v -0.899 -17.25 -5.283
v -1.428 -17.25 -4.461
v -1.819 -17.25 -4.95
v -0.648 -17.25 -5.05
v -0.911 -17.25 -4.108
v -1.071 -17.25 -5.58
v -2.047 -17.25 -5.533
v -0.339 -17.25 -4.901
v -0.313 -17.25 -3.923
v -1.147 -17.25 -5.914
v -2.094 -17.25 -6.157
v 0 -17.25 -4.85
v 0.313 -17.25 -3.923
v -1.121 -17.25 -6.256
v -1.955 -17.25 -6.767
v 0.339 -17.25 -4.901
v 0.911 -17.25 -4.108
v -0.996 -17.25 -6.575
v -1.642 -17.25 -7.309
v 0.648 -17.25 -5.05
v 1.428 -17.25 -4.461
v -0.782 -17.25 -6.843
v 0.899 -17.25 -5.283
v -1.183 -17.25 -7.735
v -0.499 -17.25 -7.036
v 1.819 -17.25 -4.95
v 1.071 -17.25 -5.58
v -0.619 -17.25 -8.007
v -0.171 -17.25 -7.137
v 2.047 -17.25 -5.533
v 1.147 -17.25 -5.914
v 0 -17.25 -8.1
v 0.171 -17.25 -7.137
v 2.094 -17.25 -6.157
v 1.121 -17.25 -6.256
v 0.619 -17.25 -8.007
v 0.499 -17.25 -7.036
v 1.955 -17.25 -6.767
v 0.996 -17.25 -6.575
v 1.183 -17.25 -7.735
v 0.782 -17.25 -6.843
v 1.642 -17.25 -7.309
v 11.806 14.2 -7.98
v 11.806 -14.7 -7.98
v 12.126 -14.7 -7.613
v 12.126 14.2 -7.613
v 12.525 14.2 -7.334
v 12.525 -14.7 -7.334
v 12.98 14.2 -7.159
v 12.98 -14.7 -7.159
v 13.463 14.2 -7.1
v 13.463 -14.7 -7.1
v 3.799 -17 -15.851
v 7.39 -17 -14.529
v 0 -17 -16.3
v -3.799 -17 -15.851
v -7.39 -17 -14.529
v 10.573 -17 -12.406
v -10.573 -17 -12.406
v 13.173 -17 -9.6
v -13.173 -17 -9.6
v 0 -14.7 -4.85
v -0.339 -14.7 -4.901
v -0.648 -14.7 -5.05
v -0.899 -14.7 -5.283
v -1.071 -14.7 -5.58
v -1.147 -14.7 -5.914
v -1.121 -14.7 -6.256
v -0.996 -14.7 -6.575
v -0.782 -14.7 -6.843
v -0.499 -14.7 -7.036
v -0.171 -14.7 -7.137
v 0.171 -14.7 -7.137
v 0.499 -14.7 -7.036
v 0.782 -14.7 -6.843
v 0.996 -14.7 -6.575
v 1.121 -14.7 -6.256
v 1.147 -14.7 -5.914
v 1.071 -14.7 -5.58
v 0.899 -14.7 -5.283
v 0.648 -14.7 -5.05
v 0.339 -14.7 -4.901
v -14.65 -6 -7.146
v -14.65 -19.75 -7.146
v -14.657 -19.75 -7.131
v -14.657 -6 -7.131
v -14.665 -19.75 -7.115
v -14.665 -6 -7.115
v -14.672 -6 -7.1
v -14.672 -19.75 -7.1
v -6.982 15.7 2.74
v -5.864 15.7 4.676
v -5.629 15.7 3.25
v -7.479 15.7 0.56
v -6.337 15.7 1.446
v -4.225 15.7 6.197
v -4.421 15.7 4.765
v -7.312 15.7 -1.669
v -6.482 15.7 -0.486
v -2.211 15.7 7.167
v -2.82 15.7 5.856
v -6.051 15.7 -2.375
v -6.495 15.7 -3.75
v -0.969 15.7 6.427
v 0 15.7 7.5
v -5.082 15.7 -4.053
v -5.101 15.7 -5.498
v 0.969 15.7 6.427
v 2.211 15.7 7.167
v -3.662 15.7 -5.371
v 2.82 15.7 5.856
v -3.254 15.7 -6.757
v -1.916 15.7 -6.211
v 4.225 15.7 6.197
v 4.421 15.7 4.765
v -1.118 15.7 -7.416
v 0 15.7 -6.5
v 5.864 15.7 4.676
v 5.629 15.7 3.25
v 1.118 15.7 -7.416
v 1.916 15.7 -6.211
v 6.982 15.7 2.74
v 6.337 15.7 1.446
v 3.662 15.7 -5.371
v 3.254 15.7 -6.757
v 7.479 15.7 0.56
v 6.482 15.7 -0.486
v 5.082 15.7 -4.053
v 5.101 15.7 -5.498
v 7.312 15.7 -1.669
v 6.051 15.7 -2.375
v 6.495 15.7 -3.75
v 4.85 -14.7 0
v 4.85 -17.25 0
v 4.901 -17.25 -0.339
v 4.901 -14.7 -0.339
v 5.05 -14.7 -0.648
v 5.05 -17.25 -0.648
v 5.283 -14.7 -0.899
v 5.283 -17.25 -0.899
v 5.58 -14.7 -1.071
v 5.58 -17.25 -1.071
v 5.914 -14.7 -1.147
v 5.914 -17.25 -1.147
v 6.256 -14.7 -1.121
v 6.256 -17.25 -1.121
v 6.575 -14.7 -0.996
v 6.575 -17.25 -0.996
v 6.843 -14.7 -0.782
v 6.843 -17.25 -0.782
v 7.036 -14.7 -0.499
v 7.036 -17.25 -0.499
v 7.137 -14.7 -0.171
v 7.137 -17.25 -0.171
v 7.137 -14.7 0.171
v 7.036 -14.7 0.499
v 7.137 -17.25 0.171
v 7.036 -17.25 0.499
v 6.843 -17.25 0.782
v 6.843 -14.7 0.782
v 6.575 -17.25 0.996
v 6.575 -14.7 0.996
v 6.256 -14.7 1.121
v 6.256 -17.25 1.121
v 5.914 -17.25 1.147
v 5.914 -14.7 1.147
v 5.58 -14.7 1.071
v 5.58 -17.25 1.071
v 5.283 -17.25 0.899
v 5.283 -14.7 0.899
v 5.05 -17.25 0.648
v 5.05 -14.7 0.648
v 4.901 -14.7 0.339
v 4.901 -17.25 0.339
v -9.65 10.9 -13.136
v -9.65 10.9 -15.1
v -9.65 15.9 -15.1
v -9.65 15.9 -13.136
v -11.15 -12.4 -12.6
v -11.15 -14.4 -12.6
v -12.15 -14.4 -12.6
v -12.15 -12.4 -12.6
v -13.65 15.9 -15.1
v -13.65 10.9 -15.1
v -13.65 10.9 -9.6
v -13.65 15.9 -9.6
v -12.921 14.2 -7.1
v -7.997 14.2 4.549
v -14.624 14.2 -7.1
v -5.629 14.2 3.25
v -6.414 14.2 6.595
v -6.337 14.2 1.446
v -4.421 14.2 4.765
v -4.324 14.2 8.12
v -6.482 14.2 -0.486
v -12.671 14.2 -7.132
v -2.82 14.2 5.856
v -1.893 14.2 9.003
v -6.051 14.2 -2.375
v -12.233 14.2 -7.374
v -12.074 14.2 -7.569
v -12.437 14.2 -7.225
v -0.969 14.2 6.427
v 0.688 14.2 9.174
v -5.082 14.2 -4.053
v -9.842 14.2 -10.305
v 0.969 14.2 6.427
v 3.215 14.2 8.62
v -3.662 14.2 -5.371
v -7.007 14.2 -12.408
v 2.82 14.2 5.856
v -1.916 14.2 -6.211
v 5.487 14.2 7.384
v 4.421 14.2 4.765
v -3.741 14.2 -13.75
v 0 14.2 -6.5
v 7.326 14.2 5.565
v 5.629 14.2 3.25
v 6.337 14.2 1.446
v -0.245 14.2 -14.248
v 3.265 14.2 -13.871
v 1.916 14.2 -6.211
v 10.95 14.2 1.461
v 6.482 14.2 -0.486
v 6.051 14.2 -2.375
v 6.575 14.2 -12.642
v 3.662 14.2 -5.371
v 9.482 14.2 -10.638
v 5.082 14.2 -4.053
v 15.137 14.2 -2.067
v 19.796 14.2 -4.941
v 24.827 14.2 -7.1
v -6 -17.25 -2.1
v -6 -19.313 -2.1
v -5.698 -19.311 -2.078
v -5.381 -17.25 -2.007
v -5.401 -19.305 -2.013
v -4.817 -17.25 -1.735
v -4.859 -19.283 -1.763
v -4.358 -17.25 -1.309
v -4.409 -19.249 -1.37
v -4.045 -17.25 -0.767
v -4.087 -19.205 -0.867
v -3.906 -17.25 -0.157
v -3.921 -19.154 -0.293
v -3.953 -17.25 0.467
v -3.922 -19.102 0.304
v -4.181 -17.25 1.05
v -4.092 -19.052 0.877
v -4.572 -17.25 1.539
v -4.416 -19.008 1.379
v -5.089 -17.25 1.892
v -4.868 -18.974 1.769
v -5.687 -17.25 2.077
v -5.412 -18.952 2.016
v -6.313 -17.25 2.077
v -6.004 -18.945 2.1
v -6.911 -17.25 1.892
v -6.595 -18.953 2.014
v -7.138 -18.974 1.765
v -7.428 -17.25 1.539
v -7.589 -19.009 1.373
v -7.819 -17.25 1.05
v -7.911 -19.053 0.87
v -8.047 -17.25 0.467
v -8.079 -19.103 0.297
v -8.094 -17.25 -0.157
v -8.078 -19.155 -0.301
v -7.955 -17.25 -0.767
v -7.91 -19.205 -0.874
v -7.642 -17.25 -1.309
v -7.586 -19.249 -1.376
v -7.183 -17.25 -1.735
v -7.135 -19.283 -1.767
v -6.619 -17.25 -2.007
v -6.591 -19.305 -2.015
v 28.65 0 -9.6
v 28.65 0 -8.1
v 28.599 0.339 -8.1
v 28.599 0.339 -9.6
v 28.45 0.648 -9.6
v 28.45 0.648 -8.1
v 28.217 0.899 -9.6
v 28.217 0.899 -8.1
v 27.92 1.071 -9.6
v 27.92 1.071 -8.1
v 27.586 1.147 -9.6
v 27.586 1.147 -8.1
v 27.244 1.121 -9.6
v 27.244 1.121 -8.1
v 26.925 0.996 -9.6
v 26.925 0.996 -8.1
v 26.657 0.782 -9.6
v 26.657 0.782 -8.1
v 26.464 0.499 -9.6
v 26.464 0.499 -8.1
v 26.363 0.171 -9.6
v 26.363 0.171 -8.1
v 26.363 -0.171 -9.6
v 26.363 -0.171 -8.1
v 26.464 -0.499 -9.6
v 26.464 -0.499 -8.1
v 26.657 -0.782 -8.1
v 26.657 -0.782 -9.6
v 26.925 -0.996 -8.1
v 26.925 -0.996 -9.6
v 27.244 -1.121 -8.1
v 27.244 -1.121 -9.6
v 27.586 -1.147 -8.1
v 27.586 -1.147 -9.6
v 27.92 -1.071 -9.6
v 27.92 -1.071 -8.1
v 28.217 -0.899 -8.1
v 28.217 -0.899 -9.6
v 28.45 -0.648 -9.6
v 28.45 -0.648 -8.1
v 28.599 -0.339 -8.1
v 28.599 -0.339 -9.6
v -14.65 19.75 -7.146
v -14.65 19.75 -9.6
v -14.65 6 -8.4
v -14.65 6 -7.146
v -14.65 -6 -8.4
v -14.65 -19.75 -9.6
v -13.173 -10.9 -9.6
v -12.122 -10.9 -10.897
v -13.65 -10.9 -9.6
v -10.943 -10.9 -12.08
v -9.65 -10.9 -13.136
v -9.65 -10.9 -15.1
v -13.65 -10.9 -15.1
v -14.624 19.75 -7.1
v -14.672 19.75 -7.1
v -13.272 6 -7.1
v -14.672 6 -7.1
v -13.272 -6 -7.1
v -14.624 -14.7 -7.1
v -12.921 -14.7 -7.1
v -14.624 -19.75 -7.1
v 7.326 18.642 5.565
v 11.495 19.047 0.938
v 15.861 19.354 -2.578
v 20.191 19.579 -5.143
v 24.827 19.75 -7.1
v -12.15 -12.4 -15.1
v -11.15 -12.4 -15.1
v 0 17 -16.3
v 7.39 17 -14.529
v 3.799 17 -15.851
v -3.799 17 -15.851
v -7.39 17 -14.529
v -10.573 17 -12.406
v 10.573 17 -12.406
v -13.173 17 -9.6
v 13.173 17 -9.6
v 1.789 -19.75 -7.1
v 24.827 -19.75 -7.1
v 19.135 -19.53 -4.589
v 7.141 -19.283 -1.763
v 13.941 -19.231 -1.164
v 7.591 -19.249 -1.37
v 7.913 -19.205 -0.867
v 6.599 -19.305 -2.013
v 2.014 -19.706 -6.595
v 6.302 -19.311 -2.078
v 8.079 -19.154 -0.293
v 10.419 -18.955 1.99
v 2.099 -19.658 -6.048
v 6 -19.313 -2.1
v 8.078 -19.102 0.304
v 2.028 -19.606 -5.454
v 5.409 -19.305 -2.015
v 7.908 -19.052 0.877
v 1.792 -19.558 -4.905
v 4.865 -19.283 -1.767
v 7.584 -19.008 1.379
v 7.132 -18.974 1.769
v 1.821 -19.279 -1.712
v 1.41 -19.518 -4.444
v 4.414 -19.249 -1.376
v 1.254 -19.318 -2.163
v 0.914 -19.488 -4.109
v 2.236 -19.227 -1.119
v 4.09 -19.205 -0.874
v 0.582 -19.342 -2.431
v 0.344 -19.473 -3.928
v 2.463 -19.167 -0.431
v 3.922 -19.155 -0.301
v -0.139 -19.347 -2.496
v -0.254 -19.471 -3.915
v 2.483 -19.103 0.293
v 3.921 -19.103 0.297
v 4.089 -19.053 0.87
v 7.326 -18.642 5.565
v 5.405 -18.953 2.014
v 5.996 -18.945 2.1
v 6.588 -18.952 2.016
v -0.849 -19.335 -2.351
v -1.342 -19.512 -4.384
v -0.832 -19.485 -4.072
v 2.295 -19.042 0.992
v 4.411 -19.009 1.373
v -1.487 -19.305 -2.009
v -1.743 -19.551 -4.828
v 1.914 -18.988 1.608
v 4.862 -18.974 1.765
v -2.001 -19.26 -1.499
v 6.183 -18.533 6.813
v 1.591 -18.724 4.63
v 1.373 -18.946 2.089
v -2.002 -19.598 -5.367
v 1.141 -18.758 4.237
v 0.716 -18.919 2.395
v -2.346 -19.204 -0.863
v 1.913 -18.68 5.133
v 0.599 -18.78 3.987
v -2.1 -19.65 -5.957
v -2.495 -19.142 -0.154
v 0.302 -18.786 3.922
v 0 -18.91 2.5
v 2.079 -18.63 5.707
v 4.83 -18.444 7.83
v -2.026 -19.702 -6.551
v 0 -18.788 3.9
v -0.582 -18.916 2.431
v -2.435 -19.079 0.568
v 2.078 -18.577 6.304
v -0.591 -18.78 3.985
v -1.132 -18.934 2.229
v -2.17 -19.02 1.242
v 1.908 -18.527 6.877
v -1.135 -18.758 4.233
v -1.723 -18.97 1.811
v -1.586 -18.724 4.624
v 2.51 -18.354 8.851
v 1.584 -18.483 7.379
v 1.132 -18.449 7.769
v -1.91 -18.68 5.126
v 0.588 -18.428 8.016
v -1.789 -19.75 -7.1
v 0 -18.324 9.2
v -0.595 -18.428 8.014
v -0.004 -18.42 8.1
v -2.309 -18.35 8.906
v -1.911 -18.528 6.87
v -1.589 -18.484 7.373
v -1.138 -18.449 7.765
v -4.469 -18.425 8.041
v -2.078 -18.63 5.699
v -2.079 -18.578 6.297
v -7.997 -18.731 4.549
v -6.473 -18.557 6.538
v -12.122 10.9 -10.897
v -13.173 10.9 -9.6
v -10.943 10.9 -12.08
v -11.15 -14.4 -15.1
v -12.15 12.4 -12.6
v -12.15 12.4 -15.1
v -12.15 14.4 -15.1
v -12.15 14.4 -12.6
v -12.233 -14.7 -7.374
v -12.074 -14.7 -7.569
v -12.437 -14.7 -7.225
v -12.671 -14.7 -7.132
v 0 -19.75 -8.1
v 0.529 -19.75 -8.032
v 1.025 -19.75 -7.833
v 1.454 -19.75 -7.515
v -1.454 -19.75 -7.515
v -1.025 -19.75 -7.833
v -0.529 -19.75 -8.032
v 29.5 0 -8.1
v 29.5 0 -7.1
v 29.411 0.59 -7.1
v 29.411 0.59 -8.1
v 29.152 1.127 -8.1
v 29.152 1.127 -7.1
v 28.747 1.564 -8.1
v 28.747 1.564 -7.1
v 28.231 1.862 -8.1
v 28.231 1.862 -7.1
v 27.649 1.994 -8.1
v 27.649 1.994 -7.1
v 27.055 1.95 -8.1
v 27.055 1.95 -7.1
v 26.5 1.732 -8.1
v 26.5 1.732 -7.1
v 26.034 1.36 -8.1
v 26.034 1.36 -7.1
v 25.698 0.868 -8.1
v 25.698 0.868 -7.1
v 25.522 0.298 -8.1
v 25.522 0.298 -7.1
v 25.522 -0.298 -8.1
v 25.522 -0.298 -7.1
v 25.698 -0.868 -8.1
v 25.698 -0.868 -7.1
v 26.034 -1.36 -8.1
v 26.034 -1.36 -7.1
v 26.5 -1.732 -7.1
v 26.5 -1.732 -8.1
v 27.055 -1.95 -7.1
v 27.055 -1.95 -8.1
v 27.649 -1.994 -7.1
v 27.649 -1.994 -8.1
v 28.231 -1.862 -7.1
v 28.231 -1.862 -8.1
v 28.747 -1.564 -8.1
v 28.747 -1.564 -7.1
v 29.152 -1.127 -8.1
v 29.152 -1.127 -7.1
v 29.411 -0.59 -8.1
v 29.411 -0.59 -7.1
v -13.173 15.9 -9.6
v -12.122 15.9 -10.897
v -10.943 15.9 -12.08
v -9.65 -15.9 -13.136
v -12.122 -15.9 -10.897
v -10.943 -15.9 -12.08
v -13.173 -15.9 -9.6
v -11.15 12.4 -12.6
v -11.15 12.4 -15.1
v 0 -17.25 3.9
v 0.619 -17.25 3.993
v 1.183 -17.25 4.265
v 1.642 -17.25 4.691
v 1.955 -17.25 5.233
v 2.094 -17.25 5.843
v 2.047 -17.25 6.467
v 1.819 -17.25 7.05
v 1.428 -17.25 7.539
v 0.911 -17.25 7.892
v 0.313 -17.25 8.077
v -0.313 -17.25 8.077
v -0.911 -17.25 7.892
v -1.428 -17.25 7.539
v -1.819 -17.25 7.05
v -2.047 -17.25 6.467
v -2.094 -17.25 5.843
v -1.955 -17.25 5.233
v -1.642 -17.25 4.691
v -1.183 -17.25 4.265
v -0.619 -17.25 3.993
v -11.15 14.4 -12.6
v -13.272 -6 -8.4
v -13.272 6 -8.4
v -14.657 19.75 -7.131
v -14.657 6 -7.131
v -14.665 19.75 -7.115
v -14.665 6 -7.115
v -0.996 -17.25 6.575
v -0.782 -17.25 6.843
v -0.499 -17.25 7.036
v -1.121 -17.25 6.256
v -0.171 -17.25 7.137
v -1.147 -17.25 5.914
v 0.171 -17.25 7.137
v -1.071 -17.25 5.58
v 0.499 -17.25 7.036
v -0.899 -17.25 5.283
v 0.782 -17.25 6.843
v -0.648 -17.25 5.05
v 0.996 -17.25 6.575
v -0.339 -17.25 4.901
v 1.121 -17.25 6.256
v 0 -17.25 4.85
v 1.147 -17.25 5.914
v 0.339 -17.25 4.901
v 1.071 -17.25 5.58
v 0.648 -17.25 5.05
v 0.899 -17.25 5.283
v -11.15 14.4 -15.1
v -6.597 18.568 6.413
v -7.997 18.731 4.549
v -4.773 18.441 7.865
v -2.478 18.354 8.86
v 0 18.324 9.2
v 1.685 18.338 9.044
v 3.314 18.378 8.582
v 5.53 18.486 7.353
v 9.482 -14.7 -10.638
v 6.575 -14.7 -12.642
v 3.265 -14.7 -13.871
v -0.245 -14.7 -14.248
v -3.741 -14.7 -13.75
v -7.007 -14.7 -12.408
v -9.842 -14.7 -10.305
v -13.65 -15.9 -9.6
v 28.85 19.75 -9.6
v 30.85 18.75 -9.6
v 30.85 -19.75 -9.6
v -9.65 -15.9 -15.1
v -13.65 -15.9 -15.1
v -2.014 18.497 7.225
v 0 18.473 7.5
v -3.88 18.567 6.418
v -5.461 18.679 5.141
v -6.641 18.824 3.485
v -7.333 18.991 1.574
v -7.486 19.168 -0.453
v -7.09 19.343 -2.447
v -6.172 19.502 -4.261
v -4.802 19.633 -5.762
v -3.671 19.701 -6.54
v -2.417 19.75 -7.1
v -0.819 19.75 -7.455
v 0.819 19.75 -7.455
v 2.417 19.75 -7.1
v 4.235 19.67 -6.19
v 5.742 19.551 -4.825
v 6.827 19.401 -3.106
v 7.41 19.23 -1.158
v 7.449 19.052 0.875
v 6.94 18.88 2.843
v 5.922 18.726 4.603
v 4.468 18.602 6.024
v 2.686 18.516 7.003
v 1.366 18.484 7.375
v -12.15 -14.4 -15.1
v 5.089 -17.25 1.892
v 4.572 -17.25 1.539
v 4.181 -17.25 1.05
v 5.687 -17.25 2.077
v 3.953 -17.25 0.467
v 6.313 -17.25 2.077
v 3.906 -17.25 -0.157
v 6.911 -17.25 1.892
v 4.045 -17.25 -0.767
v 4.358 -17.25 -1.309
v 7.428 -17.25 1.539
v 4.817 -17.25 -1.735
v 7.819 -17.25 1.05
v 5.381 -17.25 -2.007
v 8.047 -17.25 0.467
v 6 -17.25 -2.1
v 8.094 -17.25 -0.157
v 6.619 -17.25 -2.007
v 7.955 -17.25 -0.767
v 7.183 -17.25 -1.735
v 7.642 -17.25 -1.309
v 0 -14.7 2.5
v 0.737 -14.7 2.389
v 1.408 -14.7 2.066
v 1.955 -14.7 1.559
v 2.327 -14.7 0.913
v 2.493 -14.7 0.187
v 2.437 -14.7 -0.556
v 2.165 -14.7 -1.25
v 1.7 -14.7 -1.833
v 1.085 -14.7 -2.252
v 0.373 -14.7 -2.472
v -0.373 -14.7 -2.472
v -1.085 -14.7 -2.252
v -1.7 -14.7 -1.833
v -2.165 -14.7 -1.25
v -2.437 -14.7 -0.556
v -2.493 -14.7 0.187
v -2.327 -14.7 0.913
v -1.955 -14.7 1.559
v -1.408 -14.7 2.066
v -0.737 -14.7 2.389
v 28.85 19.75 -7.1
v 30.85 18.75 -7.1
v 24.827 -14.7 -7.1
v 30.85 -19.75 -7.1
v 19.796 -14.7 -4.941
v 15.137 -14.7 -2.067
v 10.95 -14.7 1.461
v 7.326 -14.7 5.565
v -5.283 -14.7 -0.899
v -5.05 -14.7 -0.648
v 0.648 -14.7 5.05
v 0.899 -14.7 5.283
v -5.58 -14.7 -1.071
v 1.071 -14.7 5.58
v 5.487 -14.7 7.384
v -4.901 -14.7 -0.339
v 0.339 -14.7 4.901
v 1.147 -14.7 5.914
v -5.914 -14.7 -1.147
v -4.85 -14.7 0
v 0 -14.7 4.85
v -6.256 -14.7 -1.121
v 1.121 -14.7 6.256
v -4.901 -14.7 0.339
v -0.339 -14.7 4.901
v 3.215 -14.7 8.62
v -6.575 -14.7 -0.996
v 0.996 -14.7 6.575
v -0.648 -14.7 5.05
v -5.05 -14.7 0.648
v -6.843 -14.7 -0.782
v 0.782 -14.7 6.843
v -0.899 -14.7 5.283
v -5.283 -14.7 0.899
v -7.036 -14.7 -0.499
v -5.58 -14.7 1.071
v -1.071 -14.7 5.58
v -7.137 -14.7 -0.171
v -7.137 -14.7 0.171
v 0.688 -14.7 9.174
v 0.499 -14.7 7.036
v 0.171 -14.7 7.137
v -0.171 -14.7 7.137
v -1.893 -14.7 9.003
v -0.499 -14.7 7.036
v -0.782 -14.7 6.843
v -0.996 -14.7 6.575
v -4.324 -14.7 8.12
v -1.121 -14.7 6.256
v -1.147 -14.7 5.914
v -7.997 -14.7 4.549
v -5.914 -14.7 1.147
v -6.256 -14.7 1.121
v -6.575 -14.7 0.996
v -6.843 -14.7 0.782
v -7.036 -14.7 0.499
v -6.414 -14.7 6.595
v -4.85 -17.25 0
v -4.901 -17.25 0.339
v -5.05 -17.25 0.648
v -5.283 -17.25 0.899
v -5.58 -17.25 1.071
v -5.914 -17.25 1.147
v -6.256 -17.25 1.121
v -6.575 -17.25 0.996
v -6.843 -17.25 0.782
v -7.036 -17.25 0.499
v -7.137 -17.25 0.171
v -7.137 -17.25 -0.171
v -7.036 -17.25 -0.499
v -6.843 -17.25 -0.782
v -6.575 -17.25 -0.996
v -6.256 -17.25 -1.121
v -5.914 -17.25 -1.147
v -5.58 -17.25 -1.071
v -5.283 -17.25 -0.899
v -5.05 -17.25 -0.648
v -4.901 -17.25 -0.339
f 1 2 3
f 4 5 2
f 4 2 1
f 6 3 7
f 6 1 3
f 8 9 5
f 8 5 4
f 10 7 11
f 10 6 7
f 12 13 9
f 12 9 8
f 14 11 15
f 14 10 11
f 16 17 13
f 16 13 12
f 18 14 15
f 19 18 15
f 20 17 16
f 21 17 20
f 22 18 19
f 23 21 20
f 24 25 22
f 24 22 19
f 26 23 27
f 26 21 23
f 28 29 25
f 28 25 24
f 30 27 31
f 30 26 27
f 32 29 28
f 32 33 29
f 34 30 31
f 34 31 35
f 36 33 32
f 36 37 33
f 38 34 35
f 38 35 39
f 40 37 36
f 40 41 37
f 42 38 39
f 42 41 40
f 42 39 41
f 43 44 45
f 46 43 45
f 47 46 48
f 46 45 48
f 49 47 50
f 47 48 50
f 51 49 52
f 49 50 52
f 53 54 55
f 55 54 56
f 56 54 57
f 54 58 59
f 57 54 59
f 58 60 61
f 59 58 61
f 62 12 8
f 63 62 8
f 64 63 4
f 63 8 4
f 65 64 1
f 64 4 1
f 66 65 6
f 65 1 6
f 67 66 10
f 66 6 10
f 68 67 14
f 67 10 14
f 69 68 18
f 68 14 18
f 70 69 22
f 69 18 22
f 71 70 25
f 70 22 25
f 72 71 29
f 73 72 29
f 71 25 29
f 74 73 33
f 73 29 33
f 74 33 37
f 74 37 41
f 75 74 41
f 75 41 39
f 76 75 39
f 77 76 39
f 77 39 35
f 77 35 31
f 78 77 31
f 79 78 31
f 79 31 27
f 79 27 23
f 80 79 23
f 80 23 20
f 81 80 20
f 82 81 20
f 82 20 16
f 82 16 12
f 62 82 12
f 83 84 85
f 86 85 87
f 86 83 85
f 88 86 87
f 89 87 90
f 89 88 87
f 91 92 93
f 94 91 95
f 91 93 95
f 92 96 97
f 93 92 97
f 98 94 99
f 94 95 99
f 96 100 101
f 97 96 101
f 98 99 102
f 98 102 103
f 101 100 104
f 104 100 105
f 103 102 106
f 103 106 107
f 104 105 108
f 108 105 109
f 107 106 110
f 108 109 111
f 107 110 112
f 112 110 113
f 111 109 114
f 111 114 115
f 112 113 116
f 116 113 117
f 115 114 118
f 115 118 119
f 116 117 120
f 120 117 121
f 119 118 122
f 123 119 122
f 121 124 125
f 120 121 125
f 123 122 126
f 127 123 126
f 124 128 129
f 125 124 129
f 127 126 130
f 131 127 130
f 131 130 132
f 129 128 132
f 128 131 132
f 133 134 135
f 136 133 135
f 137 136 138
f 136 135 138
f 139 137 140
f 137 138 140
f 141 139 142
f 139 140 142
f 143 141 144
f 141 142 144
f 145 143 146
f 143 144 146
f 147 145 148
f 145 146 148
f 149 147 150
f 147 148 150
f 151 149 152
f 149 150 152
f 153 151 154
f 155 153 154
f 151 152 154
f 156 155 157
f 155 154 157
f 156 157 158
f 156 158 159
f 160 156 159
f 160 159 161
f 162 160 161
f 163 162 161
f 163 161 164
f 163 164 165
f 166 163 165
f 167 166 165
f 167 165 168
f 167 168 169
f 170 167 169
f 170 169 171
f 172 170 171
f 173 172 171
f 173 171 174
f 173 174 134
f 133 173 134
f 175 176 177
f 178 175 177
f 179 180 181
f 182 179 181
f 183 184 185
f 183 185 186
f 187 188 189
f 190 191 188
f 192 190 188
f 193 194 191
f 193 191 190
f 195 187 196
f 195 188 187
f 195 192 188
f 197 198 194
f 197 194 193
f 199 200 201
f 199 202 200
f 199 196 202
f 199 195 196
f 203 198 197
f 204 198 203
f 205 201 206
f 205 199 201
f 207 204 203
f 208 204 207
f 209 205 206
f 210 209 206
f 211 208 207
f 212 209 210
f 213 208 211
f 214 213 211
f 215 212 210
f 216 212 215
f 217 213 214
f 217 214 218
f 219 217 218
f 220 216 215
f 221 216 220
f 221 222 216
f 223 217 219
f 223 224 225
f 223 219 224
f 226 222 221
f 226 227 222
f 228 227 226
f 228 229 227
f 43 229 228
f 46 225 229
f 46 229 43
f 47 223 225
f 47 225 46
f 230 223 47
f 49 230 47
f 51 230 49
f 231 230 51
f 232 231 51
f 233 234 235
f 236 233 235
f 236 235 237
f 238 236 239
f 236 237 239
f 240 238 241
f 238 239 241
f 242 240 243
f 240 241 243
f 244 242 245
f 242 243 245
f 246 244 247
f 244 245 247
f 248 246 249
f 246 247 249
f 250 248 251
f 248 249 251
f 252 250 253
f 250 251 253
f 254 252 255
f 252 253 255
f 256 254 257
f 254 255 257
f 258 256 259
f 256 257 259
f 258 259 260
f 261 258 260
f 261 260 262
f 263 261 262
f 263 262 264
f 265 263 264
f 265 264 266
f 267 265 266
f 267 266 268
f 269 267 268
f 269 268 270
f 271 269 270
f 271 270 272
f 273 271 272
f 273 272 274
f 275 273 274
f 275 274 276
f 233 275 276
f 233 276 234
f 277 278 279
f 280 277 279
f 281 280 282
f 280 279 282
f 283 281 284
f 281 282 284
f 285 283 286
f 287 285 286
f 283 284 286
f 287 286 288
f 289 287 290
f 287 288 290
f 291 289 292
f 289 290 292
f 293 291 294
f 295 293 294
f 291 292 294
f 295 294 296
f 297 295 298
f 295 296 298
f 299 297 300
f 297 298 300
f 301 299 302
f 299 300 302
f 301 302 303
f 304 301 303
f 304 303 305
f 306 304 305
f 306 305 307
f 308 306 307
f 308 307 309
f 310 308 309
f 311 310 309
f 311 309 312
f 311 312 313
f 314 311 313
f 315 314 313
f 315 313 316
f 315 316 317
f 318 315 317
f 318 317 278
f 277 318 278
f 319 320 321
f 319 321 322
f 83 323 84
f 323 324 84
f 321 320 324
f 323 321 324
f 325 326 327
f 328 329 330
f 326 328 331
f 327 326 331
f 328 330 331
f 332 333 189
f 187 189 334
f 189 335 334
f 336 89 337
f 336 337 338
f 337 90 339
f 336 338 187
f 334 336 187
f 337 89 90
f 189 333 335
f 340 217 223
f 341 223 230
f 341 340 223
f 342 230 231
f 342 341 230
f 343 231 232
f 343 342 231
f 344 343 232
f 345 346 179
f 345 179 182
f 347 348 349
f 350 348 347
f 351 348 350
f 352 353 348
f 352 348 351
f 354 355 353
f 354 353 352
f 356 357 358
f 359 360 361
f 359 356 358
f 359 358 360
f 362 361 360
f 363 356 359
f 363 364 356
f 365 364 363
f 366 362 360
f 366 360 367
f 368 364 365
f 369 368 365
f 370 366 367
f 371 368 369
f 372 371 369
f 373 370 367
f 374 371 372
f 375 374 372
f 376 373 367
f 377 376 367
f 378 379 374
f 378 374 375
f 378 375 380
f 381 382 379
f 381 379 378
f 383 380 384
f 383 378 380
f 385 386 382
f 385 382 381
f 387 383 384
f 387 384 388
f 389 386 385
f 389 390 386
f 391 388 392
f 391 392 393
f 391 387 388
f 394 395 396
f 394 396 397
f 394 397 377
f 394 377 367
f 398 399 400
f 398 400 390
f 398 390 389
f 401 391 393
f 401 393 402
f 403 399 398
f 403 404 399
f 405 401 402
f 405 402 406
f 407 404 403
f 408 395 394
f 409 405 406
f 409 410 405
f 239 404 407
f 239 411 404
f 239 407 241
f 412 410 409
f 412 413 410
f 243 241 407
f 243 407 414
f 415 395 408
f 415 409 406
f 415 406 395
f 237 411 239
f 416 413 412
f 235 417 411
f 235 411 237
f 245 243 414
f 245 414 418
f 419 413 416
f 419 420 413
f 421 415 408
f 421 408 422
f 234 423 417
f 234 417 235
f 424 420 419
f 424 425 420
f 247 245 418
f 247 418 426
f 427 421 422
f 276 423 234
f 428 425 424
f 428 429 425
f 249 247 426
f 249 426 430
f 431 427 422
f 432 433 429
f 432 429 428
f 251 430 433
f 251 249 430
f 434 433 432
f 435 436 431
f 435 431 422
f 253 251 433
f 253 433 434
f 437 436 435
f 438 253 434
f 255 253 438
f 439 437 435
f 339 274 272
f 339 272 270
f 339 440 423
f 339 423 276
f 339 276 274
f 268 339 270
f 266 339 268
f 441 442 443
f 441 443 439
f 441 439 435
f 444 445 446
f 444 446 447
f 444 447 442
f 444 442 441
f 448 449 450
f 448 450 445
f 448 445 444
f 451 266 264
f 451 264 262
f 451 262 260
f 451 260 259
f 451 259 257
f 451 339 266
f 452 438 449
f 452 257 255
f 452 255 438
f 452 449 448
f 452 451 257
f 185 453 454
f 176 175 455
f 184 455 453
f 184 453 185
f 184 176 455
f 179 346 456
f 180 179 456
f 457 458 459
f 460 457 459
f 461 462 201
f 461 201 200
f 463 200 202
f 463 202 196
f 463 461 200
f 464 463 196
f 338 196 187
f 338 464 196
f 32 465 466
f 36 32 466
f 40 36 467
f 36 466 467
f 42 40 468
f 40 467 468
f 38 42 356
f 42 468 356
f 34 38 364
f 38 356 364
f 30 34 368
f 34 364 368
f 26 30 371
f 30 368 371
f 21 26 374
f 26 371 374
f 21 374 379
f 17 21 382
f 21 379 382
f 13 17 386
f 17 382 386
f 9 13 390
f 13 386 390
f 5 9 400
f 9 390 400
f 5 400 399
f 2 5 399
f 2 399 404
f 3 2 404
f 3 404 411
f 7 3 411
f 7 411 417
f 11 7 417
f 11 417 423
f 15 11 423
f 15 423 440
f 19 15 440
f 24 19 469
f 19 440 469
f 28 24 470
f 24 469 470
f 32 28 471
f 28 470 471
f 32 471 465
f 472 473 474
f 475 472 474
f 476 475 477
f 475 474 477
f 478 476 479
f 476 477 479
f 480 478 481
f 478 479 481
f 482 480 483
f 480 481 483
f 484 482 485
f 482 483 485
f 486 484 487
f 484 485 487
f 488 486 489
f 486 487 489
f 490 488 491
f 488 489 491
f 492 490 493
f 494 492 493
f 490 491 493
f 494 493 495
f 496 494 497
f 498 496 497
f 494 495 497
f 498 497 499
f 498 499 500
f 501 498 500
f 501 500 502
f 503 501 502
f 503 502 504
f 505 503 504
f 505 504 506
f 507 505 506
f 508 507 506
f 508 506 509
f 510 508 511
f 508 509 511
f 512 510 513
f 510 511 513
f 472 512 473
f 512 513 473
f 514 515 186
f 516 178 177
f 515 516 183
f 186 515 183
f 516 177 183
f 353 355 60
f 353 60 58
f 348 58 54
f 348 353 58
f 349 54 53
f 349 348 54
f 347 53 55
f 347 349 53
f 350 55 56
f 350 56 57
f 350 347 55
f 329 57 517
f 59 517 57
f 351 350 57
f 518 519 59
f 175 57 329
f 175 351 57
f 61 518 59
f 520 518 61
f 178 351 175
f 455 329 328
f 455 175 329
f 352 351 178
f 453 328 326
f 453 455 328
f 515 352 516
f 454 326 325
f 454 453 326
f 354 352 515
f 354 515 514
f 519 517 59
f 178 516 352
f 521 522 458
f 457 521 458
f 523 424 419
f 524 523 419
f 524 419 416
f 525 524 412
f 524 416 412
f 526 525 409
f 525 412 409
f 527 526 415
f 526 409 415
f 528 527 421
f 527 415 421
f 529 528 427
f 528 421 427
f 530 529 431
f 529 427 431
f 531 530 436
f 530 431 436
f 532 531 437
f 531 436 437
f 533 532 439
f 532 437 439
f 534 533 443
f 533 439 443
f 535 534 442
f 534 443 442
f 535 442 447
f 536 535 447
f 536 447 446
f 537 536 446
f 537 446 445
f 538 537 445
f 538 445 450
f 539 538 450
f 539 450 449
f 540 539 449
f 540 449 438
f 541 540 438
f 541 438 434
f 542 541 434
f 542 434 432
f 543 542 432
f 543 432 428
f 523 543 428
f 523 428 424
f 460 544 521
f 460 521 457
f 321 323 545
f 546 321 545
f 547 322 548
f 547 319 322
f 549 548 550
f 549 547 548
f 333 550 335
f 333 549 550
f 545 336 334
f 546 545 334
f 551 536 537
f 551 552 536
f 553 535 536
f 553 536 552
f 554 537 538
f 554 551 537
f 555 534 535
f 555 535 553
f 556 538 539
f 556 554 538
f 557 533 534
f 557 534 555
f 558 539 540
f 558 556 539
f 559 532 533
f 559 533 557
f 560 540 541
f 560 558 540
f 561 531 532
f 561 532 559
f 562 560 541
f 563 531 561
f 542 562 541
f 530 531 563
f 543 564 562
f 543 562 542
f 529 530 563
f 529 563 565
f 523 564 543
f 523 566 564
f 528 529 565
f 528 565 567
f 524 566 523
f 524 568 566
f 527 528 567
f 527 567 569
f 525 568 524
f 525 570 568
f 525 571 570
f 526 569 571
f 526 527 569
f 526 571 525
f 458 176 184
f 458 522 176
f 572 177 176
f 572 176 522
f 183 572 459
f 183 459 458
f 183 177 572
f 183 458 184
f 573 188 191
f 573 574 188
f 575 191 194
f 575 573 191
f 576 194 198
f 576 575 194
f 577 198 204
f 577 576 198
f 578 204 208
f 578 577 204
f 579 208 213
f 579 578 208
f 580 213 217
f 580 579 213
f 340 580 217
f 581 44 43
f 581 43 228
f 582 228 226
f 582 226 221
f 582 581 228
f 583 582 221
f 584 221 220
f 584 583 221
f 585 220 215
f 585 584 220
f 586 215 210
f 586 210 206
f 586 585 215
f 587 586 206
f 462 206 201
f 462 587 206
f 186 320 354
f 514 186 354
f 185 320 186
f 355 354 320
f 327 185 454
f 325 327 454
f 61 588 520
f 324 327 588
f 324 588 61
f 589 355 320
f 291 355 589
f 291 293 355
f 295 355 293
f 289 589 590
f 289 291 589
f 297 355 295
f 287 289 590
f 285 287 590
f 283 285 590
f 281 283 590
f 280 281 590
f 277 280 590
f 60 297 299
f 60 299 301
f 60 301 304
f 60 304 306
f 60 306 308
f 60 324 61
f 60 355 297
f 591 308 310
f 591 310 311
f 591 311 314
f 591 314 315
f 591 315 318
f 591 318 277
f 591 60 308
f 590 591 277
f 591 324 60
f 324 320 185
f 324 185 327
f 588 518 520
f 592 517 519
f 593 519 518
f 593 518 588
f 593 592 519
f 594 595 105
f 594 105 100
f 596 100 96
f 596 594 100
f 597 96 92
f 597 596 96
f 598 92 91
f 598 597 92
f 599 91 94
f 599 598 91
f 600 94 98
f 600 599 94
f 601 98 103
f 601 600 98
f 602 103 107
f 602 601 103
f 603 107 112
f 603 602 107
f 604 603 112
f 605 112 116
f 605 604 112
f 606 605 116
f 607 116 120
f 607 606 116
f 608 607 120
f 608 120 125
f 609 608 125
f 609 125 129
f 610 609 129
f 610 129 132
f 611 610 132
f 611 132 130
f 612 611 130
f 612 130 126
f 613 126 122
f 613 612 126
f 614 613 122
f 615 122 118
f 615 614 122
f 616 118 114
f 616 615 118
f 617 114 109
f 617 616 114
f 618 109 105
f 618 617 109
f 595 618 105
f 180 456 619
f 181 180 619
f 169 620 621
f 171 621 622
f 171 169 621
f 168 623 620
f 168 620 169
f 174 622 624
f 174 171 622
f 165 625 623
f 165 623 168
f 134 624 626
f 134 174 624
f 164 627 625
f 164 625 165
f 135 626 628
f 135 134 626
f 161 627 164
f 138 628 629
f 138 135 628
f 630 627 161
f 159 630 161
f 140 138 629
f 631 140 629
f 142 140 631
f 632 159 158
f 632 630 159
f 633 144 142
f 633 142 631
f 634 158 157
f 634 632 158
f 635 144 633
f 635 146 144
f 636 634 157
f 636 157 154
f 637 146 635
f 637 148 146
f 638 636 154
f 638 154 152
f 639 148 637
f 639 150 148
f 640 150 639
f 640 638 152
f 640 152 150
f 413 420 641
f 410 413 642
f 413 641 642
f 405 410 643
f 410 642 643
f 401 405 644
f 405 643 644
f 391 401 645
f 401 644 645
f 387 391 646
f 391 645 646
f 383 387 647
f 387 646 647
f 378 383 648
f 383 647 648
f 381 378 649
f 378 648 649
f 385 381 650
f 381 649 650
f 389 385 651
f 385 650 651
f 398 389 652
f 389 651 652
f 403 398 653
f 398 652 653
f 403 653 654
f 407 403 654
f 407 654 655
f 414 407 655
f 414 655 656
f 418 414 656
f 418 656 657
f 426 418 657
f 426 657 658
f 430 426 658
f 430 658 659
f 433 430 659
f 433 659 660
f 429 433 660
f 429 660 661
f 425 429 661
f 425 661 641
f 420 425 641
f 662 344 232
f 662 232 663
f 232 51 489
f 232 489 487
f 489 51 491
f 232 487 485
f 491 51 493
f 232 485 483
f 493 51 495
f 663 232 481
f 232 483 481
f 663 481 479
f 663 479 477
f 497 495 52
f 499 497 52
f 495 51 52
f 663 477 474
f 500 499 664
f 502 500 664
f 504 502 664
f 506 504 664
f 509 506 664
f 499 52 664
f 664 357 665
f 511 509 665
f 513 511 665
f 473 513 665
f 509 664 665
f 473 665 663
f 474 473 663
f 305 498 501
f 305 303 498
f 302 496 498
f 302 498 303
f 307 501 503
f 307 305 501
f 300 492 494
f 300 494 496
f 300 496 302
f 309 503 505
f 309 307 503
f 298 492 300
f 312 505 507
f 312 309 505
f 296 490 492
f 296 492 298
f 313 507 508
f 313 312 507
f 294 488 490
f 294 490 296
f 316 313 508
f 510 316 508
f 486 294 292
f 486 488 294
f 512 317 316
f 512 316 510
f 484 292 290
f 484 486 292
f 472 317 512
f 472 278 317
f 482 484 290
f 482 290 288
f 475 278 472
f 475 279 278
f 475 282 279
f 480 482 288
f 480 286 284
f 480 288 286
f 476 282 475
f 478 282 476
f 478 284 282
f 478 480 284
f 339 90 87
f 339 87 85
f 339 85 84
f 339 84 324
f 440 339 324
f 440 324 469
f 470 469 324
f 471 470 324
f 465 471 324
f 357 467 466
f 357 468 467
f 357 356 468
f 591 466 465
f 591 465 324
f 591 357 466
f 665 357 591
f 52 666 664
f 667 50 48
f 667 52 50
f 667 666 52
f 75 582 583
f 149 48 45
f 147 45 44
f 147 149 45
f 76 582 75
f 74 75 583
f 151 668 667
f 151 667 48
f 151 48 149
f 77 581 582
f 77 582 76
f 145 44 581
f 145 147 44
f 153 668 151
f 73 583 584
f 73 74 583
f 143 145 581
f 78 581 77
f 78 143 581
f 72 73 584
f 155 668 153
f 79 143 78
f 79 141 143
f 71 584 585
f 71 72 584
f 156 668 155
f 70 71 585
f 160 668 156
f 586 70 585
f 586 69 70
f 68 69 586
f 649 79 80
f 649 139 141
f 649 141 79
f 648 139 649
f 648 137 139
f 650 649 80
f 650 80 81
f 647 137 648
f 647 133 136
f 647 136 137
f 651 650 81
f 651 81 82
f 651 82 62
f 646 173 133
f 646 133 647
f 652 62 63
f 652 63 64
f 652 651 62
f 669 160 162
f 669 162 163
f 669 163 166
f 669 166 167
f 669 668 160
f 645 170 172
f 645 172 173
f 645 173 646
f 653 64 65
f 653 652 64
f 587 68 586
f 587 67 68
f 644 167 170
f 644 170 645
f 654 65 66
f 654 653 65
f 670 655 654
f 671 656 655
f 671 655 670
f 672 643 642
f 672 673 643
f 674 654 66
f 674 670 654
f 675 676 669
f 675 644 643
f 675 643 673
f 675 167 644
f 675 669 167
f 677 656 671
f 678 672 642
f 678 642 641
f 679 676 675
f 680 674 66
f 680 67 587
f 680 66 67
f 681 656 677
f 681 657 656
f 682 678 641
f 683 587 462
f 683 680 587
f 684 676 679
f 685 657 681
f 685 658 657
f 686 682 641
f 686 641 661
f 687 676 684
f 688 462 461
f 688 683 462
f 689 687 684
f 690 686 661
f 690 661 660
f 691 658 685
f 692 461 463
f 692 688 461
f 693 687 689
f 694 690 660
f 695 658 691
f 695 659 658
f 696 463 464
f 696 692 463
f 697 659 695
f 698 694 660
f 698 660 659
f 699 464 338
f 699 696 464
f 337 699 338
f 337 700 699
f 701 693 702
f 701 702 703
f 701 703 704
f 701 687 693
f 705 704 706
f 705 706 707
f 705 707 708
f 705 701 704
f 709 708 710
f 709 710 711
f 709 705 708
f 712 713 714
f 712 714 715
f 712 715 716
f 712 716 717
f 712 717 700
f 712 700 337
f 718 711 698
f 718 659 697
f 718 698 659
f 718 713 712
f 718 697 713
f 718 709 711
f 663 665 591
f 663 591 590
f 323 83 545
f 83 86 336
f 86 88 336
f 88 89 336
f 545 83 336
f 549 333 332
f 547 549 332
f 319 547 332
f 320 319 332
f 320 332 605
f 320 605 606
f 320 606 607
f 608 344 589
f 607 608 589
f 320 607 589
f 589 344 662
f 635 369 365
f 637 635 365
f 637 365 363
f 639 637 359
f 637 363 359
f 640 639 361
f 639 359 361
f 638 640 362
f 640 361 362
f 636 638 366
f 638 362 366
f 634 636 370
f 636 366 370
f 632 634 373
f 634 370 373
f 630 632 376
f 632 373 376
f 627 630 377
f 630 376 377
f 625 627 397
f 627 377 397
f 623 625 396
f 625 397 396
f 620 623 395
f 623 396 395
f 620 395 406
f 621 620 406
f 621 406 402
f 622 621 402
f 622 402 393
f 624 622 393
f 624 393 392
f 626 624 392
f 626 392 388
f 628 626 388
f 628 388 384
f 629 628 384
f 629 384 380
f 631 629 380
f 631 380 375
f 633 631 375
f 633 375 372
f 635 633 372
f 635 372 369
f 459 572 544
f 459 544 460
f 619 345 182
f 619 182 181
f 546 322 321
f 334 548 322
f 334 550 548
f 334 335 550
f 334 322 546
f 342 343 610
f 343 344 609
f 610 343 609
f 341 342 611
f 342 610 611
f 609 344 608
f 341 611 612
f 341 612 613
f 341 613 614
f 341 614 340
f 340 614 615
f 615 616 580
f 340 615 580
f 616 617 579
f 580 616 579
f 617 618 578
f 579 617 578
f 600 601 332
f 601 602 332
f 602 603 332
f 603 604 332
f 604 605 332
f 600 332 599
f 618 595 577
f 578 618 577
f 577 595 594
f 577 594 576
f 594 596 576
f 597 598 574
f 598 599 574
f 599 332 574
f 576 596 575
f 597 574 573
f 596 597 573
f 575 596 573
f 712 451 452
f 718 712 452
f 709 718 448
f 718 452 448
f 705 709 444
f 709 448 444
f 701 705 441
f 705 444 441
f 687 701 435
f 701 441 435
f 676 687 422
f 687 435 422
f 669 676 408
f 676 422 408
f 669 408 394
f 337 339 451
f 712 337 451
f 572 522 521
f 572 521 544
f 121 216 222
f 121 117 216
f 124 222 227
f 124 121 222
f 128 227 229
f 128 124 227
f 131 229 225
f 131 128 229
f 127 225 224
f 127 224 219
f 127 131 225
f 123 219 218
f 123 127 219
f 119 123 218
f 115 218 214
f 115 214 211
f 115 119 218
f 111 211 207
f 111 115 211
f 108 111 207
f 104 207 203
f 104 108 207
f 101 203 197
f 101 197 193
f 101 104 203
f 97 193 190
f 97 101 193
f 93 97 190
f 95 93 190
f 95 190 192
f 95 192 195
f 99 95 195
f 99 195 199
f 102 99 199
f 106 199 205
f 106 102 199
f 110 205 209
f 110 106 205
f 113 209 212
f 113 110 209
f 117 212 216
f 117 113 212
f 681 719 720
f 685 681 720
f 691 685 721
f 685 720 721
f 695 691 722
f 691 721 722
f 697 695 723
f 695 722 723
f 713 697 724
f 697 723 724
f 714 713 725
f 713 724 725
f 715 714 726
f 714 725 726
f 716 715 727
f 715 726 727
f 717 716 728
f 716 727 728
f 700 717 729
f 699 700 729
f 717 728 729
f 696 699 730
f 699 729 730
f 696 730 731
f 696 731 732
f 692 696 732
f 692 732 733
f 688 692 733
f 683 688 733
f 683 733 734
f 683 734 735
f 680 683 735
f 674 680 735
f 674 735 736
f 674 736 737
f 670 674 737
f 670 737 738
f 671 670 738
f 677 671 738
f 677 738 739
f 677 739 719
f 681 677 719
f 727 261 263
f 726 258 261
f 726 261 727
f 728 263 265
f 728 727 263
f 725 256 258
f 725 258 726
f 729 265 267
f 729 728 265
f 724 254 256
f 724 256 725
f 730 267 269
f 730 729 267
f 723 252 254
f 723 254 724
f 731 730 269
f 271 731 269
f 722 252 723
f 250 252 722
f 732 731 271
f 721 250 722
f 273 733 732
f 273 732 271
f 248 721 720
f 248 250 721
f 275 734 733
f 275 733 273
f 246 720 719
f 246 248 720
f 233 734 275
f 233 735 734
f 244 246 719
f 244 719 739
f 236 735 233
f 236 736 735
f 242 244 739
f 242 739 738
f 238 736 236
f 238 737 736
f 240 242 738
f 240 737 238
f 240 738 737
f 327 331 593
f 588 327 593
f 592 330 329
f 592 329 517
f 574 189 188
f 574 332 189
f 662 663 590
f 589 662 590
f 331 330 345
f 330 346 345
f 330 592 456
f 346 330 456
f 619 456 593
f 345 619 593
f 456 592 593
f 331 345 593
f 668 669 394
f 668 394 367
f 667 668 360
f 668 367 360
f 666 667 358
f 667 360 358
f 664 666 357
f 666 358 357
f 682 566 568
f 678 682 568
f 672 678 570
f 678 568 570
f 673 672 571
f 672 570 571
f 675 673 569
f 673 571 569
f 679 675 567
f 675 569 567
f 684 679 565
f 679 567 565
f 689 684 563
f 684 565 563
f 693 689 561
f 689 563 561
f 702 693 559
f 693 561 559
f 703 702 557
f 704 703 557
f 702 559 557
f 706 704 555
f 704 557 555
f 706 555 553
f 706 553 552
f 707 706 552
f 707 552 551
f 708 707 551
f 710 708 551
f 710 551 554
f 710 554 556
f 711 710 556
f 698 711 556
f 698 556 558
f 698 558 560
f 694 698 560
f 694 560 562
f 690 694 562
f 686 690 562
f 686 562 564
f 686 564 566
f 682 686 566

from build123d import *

# Parameters (mm, degrees)
SKETCH_1_R               = 16.3
EXTRUDE_1_DEPTH          = 19.75
SKETCH_2_W               = 46.5
SKETCH_2_H               = 2.5
EXTRUDE_2_DEPTH          = 39.5
SKETCH_3_W               = 54.844436064
SKETCH_3_H               = 25.506740045
CUT_EXTRUDE_1_DEPTH      = 50
EXTRUDE_3_DEPTH          = 5.05
SKETCH_5_R               = 14.25
CUT_EXTRUDE_2_DEPTH      = 29.4
SKETCH_6_R               = 2.5
CUT_EXTRUDE_3_DEPTH      = 50.668048079
CUT_EXTRUDE_6_REACH      = 55.295
SKETCH_9_R               = 7.5
SKETCH_12_R              = 1.15
CUT_EXTRUDE_9_DEPTH      = 41.867774591
SKETCH_13_R              = 2
CUT_EXTRUDE_10_DEPTH     = 1
SKETCH_15_W              = 2.8
SKETCH_15_H              = 12
CUT_EXTRUDE_12_DEPTH     = 1.3
EXTRUDE_5_REACH          = 46.665
EXTRUDE_5_END_RADIUS     = 16.3
SKETCH_16_W              = 4
SKETCH_16_H              = 5
SKETCH_17_W              = 1
SKETCH_17_H              = 2
CUT_EXTRUDE_13_DEPTH     = 2.5
SKETCH_19_R              = 8.51898124
SKETCH_19_R_2            = 6.5
EXTRUDE_6_DEPTH          = 2.25
CUT_EXTRUDE_18_REACH     = 55.295
SKETCH_20_R              = 1.15
PATTERN_CIRCULAR_1_COUNT = 4
CUT_EXTRUDE_8_DEPTH      = 54.084861307
SKETCH_18_W              = 26.346157216
SKETCH_18_H              = 2.75
CUT_EXTRUDE_16_DEPTH     = 12.5
FILLET_1_R               = 2
FILLET_2_R               = 1
SKETCH_21_R              = 2.1
CUT_EXTRUDE_19_DEPTH     = 2.5
CUT_EXTRUDE_START        = -10
SKETCH_22_R              = 7.5
CUT_EXTRUDE_23_DEPTH     = 10
EXTRUDE_START            = -1
SKETCH_23_R              = 7.5
SKETCH_23_R_2            = 6.5
EXTRUDE_7_DEPTH          = 1
MOVE_FACE_3_BY           = 0.5
SKETCH_27_W              = 1
SKETCH_27_H              = 39.5
CUT_EXTRUDE_24_DEPTH     = 41.867774591
CHAMFER_1_SIZE           = 2
CHAMFER_1_SIZE2          = 1


with BuildPart() as part:
    # 草图1 → 凸台-拉伸1 (new, symmetric)
    with BuildSketch(Plane(origin=(0, 0, 0), x_dir=(1, 0, 0), z_dir=(0, 1, 0))):
        with Locations(Location((0, 0, 0), (0, 0, 270))):
            Circle(SKETCH_1_R)
    extrude(amount=EXTRUDE_1_DEPTH, both=True)

    # 草图2 → 凸台-拉伸2 (add, through all)
    with BuildSketch(Plane.XZ.offset(19.75)):
        with Locations((8.6, -8.35)):
            Rectangle(SKETCH_2_W, SKETCH_2_H)
    extrude(amount=-EXTRUDE_2_DEPTH)

    # 草图3 → 切除-拉伸1 (cut)
    with BuildSketch(Plane.XZ.offset(19.75)):
        with Locations((4.427781968, 5.653370022)):
            Rectangle(SKETCH_3_W, SKETCH_3_H)
    extrude(amount=-CUT_EXTRUDE_1_DEPTH, mode=Mode.SUBTRACT)

    # 草图4 → 凸台-拉伸3 (add)
    with BuildSketch(Plane.XZ.offset(19.75)):
        with BuildLine():
            Line((-14.65, -7.146152811), (-7.996542478, 4.549209646))
            ThreePointArc((-7.996542478, 4.549209646), (-0.608425307, 9.179859402), (7.326204954, 5.564775015))
            ThreePointArc((7.326204954, 5.564775015), (15.146356853, -2.073759423), (24.85, -7.107773105))
            Line((24.85, -7.107773105), (-14.65, -7.146152811))
        make_face()
    extrude_3 = extrude(amount=-EXTRUDE_3_DEPTH)

    # 镜向1: 凸台-拉伸3 across plane
    add(extrude_3.mirror(Plane.ZX))

    # 草图5 → 切除-拉伸2 (cut)
    with BuildSketch(Plane(origin=(0, -14.7, 0), x_dir=(1, 0, 0), z_dir=(0, 1, 0))):
        Circle(SKETCH_5_R)
    extrude(amount=CUT_EXTRUDE_2_DEPTH, mode=Mode.SUBTRACT)

    # 草图6 → 切除-拉伸3 (cut, through all)
    with BuildSketch(Plane(origin=(0, -14.7, 0), x_dir=(1, 0, 0), z_dir=(0, 1, 0))):
        with Locations(Location((0, 0, 0), (0, 0, 270))):
            Circle(SKETCH_6_R)
    extrude(amount=-CUT_EXTRUDE_3_DEPTH, mode=Mode.SUBTRACT)

    # 草图9 → 切除-拉伸6 (cut, up to next)
    with BuildSketch(Plane(origin=(0, 19.75, 0), x_dir=(1, 0, 0), z_dir=(0, 1, 0)), mode=Mode.PRIVATE) as cut_extrude_6_sk1:
        with Locations(Location((0, 0, 0), (0, 0, 270))):
            Circle(SKETCH_9_R)
    cut_extrude_6_tool1 = extrude(cut_extrude_6_sk1.sketch, amount=-CUT_EXTRUDE_6_REACH, mode=Mode.PRIVATE) & part.part
    add(cut_extrude_6_tool1.solids().sort_by_distance((0, 19.75, 0))[0], mode=Mode.SUBTRACT)

    # 草图12 → 切除-拉伸9 (cut, through all)
    with BuildSketch(Plane.XY.offset(-7.1)):
        with Locations((27.5, 0)):
            Circle(SKETCH_12_R)
    extrude(amount=-CUT_EXTRUDE_9_DEPTH, mode=Mode.SUBTRACT)

    # 草图13 → 切除-拉伸10 (cut)
    with BuildSketch(Plane.XY.offset(-7.1)):
        with Locations((27.5, 0)):
            Circle(SKETCH_13_R)
    extrude(amount=-CUT_EXTRUDE_10_DEPTH, mode=Mode.SUBTRACT)

    # 草图15 → 切除-拉伸12 (cut)
    with BuildSketch(Plane.XY.offset(-7.1)):
        with Locations((-14.672423113, 0)):
            Rectangle(SKETCH_15_W, SKETCH_15_H)
    extrude(amount=-CUT_EXTRUDE_12_DEPTH, mode=Mode.SUBTRACT)

    # 凸台-拉伸5: up to this cylinder (the profile starts outside it)
    extrude_5_end = Plane(origin=(0, 13.4, 0), z_dir=(0, -1, 0)) * Cylinder(EXTRUDE_5_END_RADIUS, 126.93, mode=Mode.PRIVATE)
    # 草图16 → 凸台-拉伸5 (add, up to the surface)
    with BuildSketch(Plane(origin=(0, 0, -15.1), x_dir=(-1, 0, 0), z_dir=(0, 0, -1)), mode=Mode.PRIVATE) as extrude_5_sk1:
        with Locations((11.65, 13.4)):
            Rectangle(SKETCH_16_W, SKETCH_16_H)
    extrude_5_tool1 = extrude(extrude_5_sk1.sketch, amount=-EXTRUDE_5_REACH, mode=Mode.PRIVATE) - extrude_5_end
    extrude_5 = extrude_5_tool1.solids().sort_by_distance((-11.65, 13.4, -15.1))[0]
    add(extrude_5)

    # 镜向4: 凸台-拉伸5 across plane
    add(extrude_5.mirror(Plane.ZX))

    # 草图17 → 切除-拉伸13 (cut)
    with BuildSketch(Plane(origin=(0, 0, -15.1), x_dir=(-1, 0, 0), z_dir=(0, 0, -1))):
        with Locations((11.65, 13.4)):
            Rectangle(SKETCH_17_W, SKETCH_17_H)
    cut_extrude_13 = extrude(amount=-CUT_EXTRUDE_13_DEPTH, mode=Mode.SUBTRACT)

    # 镜向5: 切除-拉伸13 across plane
    add(cut_extrude_13.mirror(Plane.ZX), mode=Mode.SUBTRACT)

    # 草图19 → 凸台-拉伸6 (add)
    with BuildSketch(Plane(origin=(0, 19.75, 0), x_dir=(1, 0, 0), z_dir=(0, 1, 0))):
        Circle(SKETCH_19_R)
        with Locations(Location((0, 0, 0), (0, 0, 270))):
            Circle(SKETCH_19_R_2, mode=Mode.SUBTRACT)
    extrude(amount=-EXTRUDE_6_DEPTH)

    # 草图20 → 切除-拉伸18 (cut, up to next)
    with BuildSketch(Plane.XZ.offset(19.75), mode=Mode.PRIVATE) as cut_extrude_18_sk1:
        with Locations(Location((0, 6, 0), (0, 0, 270))):
            Circle(SKETCH_20_R)
    cut_extrude_18_tool1 = extrude(cut_extrude_18_sk1.sketch, amount=-CUT_EXTRUDE_18_REACH, mode=Mode.PRIVATE) & part.part
    cut_extrude_18 = cut_extrude_18_tool1.solids().sort_by_distance((0, -19.75, 6))[0]
    add(cut_extrude_18, mode=Mode.SUBTRACT)

    # 阵列(圆周)1: 切除-拉伸18 ×4 about axis
    pattern_circular_1_axis = Axis((0, 0, 0), (0, 1, 0))
    for i in range(1, PATTERN_CIRCULAR_1_COUNT):
        add(cut_extrude_18.rotate(pattern_circular_1_axis, i * 360 / PATTERN_CIRCULAR_1_COUNT), mode=Mode.SUBTRACT)

    # 草图7 → 切除-拉伸8 (cut, through all)
    with BuildSketch(Plane.ZY.offset(14.65)):
        Polygon((-7.1, 19.75), (9.2, 18.323934785), (9.2, 19.75), align=None)
    cut_extrude_8 = extrude(amount=-CUT_EXTRUDE_8_DEPTH, mode=Mode.SUBTRACT)

    # 镜向3: 切除-拉伸8 across plane
    add(cut_extrude_8.mirror(Plane.ZX), mode=Mode.SUBTRACT)

    # 草图18 → 切除-拉伸16 (cut)
    with BuildSketch(Plane(origin=(0, 0, -9.6), x_dir=(-1, 0, 0), z_dir=(0, 0, -1))):
        with Locations((0, 18.375)):
            Rectangle(SKETCH_18_W, SKETCH_18_H)
    cut_extrude_16 = extrude(amount=CUT_EXTRUDE_16_DEPTH, mode=Mode.SUBTRACT)

    # 镜向6: 切除-拉伸16 across plane
    add(cut_extrude_16.mirror(Plane.ZX), mode=Mode.SUBTRACT)

    # 圆角1
    fillet_1_edges = [part.edges().sort_by_distance(p)[0] for p in [
        (12.355262037, 0, -7.1),
    ]]
    fillet(fillet_1_edges, radius=FILLET_1_R)

    # 圆角2
    fillet_2_edges = [part.edges().sort_by_distance(p)[0] for p in [
        (-12.355262037, 0, -7.1),
    ]]
    fillet(fillet_2_edges, radius=FILLET_2_R)

    # 草图21 → 切除-拉伸19 (cut)
    with BuildSketch(Plane.XZ.offset(19.75)):
        with Locations(Location((0, 6, 0), (0, 0, 270))):
            Circle(SKETCH_21_R)
        with Locations(Location((-6, 0, 0), (0, 0, 270))):
            Circle(SKETCH_21_R)
        with Locations(Location((6, 0, 0), (0, 0, 270))):
            Circle(SKETCH_21_R)
        with Locations(Location((0, -6, 0), (0, 0, 270))):
            Circle(SKETCH_21_R)
    extrude(amount=-CUT_EXTRUDE_19_DEPTH, mode=Mode.SUBTRACT)

    # 草图22 → 切除-拉伸23 (cut)
    with BuildSketch(Plane.XZ.offset(-17.5).offset(CUT_EXTRUDE_START)):
        with Locations(Location((0, 0, 0), (0, 0, 90))):
            Circle(SKETCH_22_R)
    extrude(amount=CUT_EXTRUDE_23_DEPTH, mode=Mode.SUBTRACT)

    # 草图23 → 凸台-拉伸7 (add)
    with BuildSketch(Plane.XZ.offset(-14.7).offset(EXTRUDE_START)):
        with Locations(Location((0, 0, 0), (0, 0, 288.796905035))):
            Circle(SKETCH_23_R)
        with Locations(Location((0, 0, 0), (0, 0, 270))):
            Circle(SKETCH_23_R_2, mode=Mode.SUBTRACT)
    extrude(amount=EXTRUDE_7_DEPTH)

    # Move Face 3: a face moved outward by 0.5
    extrude(part.faces().sort_by_distance((5.10183032, 14.7, -8.3875))[0], amount=MOVE_FACE_3_BY, dir=(0, -1, 0))

    # 草图27 → 切除-拉伸24 (cut, through all)
    with BuildSketch(Plane.XY.offset(-7.1)):
        with Locations((31.35, 0)):
            Rectangle(SKETCH_27_W, SKETCH_27_H)
    extrude(amount=-CUT_EXTRUDE_24_DEPTH, mode=Mode.SUBTRACT)

    # 倒角1
    chamfer_1_edges = [part.edges().sort_by_distance(p)[0] for p in [
        (30.85, 19.75, -8.35),
    ]]
    chamfer_1_side = [part.faces().sort_by_distance(p)[0] for p in [
        (8.193237095, 19.75, -8.362550861),
    ]]
    chamfer(chamfer_1_edges, length=CHAMFER_1_SIZE, length2=CHAMFER_1_SIZE2, reference=chamfer_1_side[0])


solid = part.part
